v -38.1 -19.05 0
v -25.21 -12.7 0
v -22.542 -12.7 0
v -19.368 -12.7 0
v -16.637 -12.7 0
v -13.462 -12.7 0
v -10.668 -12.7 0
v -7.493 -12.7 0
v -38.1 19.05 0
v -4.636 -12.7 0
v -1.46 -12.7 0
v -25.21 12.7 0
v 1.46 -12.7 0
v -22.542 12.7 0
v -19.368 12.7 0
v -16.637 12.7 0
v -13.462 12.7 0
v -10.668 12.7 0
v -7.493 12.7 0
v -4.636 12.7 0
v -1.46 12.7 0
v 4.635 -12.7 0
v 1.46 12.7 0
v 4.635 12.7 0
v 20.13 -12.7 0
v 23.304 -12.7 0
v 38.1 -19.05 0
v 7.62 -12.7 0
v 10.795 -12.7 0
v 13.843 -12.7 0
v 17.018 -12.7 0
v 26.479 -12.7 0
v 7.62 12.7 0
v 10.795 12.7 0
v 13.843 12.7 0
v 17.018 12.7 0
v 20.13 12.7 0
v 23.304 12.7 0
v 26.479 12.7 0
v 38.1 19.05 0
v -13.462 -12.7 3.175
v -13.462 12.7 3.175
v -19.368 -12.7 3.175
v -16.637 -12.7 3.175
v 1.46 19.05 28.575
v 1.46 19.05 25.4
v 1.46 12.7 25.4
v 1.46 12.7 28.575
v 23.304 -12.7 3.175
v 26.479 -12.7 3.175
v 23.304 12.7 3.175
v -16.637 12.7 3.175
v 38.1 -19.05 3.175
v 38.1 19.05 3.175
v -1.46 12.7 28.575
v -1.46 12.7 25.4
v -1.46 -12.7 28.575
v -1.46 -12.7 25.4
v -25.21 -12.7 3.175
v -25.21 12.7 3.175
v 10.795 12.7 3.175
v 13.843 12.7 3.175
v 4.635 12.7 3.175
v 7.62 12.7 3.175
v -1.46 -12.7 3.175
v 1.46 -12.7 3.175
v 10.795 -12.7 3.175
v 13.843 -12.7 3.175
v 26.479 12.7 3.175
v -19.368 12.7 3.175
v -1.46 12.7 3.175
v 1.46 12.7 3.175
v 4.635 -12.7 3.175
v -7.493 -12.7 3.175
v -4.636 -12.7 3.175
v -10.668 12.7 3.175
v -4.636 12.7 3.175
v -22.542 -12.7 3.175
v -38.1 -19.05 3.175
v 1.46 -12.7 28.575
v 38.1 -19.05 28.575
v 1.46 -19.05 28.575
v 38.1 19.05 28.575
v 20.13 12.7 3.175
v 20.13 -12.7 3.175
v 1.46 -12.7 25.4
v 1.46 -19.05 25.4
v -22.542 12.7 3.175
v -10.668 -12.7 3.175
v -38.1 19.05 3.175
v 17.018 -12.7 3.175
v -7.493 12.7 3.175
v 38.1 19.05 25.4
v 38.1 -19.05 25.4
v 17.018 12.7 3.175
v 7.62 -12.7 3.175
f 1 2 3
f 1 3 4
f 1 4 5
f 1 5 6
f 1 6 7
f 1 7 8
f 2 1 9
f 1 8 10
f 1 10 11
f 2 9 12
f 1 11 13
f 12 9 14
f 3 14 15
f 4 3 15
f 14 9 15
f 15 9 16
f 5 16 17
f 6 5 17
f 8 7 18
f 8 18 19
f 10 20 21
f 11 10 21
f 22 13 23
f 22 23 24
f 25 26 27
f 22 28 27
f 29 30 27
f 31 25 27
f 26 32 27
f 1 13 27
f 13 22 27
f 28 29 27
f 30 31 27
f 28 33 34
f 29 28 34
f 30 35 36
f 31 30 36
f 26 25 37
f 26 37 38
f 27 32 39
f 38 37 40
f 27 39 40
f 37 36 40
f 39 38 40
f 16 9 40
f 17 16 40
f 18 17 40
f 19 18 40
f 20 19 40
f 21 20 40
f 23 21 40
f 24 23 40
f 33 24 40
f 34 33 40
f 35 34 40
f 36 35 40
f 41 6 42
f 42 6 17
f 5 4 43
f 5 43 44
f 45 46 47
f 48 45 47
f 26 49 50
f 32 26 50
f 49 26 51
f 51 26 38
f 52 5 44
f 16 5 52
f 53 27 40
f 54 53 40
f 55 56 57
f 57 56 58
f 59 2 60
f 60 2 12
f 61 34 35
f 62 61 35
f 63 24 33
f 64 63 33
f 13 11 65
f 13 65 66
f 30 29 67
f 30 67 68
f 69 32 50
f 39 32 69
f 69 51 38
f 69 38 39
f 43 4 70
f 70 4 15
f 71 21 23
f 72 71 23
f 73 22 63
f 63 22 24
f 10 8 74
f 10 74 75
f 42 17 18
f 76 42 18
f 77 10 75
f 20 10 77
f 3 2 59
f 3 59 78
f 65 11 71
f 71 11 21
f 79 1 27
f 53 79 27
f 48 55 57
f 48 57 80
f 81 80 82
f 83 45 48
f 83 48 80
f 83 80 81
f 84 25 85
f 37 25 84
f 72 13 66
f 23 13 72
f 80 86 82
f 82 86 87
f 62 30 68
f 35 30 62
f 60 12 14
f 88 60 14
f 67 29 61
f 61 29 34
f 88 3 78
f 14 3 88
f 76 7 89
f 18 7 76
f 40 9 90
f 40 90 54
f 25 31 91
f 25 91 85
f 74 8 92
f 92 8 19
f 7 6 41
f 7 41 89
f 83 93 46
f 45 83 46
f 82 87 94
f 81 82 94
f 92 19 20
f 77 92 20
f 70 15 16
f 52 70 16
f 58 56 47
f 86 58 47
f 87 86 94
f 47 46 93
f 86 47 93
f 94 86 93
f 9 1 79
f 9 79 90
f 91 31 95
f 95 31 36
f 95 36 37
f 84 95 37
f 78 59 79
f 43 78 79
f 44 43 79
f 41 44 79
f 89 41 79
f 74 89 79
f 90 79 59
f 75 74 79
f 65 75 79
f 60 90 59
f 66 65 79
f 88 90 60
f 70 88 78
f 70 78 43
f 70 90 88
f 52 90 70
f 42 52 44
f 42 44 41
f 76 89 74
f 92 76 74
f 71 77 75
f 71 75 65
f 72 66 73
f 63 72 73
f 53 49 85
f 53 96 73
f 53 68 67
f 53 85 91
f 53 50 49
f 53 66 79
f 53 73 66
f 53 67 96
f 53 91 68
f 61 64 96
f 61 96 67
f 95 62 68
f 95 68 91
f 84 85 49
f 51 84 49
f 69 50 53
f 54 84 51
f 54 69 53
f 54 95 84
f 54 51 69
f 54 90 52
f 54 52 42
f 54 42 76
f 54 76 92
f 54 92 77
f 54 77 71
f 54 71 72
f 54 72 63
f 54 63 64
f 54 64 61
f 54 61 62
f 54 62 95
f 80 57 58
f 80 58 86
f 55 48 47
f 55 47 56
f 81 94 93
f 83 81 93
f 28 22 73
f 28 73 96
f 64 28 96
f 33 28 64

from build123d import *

# Parameters (mm, degrees)
F1_W     = 76.2
F1_H     = 38.1
F1_W_2   = 2.667
F1_H_2   = 25.4
F1_W_3   = 2.7305
F1_W_4   = 2.794
F1_W_5   = 2.8575
F1_W_6   = 2.921
F1_W_7   = 2.9845
F1_W_8   = 3.048
F1_W_9   = 3.1115
F1_W_10  = 3.175
F2_DEPTH = 3.175
F5_DEPTH = 3.175


# Not quite as in the source:
# - a variable given as a bare number and used for a length is read in inches; the dataset says mm whatever the document's units were


with BuildPart() as f2:
    # F1 (on Top) → F2 (new body)
    with BuildSketch(Plane.XY):
        Rectangle(F1_W, F1_H)
        with Locations((-23.876, 0)):
            Rectangle(F1_W_2, F1_H_2, mode=Mode.SUBTRACT)
        with Locations((-18.00225, 0)):
            Rectangle(F1_W_3, F1_H_2, mode=Mode.SUBTRACT)
        with Locations((-12.065, 0)):
            Rectangle(F1_W_4, F1_H_2, mode=Mode.SUBTRACT)
        with Locations((-6.06425, 0)):
            Rectangle(F1_W_5, F1_H_2, mode=Mode.SUBTRACT)
        Rectangle(F1_W_6, F1_H_2, mode=Mode.SUBTRACT)
        with Locations((6.12775, 0)):
            Rectangle(F1_W_7, F1_H_2, mode=Mode.SUBTRACT)
        with Locations((12.319, 0)):
            Rectangle(F1_W_8, F1_H_2, mode=Mode.SUBTRACT)
        with Locations((18.57375, 0)):
            Rectangle(F1_W_9, F1_H_2, mode=Mode.SUBTRACT)
        with Locations((24.892, 0)):
            Rectangle(F1_W_10, F1_H_2, mode=Mode.SUBTRACT)
    extrude(amount=F2_DEPTH)


with BuildPart() as f5:
    # F4 (on offset) → F5 (new body)
    with BuildSketch(Plane.XY.offset(25.4)):
        Polygon((1.4605, 12.7), (-1.4605, 12.7), (-1.4605, -12.7), (1.4605, -12.7), (1.4605, -19.05), (38.1, -19.05), (38.1, 19.05), (1.4605, 19.05), align=None)
    extrude(amount=F5_DEPTH)


solid = Compound([f2.part, f5.part])
